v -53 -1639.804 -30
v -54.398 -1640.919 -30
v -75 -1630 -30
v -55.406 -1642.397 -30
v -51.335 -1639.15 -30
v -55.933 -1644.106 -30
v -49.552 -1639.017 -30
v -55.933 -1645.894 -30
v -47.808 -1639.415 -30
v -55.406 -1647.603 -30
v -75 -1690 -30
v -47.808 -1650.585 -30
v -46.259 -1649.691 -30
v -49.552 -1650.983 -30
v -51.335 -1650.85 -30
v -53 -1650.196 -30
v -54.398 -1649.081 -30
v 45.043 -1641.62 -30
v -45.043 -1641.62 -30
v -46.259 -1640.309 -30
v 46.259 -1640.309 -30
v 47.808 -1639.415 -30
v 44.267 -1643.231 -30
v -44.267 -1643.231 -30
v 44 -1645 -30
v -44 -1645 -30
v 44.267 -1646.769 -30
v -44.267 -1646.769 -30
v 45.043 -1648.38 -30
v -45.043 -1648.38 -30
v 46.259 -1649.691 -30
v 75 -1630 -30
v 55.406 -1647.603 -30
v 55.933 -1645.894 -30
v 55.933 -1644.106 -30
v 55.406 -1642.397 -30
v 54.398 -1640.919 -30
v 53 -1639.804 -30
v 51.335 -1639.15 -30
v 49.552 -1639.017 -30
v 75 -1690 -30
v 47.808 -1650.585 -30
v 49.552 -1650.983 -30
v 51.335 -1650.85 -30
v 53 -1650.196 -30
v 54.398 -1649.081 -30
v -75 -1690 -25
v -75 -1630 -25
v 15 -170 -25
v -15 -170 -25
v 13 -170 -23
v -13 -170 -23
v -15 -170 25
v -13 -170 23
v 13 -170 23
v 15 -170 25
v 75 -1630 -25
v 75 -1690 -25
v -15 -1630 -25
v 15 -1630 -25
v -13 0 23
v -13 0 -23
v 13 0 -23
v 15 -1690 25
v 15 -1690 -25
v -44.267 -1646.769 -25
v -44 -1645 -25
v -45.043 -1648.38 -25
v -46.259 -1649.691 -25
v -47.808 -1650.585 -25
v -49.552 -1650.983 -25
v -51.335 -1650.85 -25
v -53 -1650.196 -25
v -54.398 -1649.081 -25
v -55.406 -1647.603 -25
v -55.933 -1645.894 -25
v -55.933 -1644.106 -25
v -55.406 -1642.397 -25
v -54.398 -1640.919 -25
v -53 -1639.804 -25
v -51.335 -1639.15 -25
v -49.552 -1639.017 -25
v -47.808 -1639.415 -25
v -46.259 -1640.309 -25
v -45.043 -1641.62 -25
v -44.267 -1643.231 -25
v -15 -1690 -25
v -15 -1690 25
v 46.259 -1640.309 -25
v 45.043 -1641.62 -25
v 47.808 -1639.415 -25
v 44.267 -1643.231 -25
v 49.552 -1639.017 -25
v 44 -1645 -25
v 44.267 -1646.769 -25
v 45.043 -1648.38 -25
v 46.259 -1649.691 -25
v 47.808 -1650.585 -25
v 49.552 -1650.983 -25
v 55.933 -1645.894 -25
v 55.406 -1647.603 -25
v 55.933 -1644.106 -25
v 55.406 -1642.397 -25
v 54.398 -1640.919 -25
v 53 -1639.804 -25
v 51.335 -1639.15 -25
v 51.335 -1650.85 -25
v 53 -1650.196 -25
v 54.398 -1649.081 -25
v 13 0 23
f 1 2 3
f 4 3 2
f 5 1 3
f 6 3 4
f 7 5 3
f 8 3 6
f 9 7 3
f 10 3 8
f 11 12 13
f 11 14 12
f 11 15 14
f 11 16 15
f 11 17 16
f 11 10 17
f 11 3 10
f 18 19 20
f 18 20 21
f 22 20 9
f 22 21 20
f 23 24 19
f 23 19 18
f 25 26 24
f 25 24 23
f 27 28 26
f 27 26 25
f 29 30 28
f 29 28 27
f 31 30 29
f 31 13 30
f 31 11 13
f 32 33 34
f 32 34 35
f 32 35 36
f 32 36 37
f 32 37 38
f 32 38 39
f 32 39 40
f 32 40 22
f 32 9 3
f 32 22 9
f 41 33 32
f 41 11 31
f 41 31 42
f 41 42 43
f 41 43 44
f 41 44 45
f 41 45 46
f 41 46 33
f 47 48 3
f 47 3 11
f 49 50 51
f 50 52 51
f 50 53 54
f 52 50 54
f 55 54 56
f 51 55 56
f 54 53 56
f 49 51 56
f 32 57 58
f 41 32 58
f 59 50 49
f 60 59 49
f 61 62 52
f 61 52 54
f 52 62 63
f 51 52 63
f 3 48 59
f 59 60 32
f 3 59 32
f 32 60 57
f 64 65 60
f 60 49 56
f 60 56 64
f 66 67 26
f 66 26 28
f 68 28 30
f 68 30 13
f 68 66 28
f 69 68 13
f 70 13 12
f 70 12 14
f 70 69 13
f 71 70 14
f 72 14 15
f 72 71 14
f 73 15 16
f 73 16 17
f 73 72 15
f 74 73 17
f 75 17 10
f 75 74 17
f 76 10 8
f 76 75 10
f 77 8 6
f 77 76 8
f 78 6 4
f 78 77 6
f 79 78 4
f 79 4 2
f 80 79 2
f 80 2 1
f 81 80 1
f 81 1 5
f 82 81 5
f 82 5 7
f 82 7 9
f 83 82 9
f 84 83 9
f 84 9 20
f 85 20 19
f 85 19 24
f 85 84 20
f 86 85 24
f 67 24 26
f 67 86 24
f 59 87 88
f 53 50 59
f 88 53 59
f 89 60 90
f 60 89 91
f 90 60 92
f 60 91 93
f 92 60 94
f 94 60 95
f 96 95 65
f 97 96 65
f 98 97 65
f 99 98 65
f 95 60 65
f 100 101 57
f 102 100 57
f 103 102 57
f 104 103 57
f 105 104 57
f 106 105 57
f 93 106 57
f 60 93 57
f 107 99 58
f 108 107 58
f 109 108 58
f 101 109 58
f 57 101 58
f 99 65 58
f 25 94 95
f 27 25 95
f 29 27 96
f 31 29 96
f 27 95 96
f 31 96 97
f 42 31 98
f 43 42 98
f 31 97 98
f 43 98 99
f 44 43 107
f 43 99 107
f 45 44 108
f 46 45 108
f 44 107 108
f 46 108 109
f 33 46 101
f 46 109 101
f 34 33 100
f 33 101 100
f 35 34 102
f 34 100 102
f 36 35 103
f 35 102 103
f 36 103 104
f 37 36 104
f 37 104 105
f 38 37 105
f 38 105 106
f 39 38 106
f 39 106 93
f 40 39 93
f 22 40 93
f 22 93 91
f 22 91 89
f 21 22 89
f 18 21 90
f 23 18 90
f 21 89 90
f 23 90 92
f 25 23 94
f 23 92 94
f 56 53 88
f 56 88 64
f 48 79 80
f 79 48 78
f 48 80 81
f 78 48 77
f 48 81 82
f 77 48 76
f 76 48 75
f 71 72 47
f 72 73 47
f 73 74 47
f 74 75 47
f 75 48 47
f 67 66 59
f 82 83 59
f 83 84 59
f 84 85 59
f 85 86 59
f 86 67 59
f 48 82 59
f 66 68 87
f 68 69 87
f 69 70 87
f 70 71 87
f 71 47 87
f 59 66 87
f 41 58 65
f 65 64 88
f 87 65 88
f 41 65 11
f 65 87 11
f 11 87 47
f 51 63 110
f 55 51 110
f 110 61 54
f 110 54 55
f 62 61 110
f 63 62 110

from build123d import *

# Parameters (mm, degrees)
F0_W     = 26
F0_H     = 46
F1_DEPTH = 170
F2_W     = 30
F2_H     = 50
F3_DEPTH = 1520
F4_W     = 60
F4_H     = 60
F4_R     = 6
F5_DEPTH = 5


with BuildPart() as f1:
    # F0 (on Front) → F1 (new body)
    with BuildSketch(Plane.XZ):
        Rectangle(F0_W, F0_H)
    extrude(amount=F1_DEPTH)

    # F2 (on face) → F3 (join)
    with BuildSketch(Plane.XZ.offset(170)):
        Rectangle(F2_W, F2_H)
    extrude(amount=F3_DEPTH)

    # F4 (on face) → F5 (join)
    with BuildSketch(Plane(origin=(0, 0, -25), x_dir=(1, 0, 0), z_dir=(0, 0, -1))):
        Polygon((15, 1690), (-15, 1690), (-15, 1630), (15, 1630), (15, 1645), align=None)
        with Locations((-45, 1660)):
            Rectangle(F4_W, F4_H)
        with Locations((-50, 1645)):
            Circle(F4_R, mode=Mode.SUBTRACT)
        with BuildLine():
            ThreePointArc((56, 1645), (50, 1651), (44, 1645))
            ThreePointArc((44, 1645), (50, 1639), (56, 1645))
        make_face()
        Polygon((75, 1690), (15, 1690), (15, 1645), (15, 1630), (75, 1630), align=None)
        with BuildLine():
            ThreePointArc((56, 1645), (50, 1639), (44, 1645))
            ThreePointArc((44, 1645), (50, 1651), (56, 1645))
        make_face(mode=Mode.SUBTRACT)
    extrude(amount=F5_DEPTH)


solid = f1.part
